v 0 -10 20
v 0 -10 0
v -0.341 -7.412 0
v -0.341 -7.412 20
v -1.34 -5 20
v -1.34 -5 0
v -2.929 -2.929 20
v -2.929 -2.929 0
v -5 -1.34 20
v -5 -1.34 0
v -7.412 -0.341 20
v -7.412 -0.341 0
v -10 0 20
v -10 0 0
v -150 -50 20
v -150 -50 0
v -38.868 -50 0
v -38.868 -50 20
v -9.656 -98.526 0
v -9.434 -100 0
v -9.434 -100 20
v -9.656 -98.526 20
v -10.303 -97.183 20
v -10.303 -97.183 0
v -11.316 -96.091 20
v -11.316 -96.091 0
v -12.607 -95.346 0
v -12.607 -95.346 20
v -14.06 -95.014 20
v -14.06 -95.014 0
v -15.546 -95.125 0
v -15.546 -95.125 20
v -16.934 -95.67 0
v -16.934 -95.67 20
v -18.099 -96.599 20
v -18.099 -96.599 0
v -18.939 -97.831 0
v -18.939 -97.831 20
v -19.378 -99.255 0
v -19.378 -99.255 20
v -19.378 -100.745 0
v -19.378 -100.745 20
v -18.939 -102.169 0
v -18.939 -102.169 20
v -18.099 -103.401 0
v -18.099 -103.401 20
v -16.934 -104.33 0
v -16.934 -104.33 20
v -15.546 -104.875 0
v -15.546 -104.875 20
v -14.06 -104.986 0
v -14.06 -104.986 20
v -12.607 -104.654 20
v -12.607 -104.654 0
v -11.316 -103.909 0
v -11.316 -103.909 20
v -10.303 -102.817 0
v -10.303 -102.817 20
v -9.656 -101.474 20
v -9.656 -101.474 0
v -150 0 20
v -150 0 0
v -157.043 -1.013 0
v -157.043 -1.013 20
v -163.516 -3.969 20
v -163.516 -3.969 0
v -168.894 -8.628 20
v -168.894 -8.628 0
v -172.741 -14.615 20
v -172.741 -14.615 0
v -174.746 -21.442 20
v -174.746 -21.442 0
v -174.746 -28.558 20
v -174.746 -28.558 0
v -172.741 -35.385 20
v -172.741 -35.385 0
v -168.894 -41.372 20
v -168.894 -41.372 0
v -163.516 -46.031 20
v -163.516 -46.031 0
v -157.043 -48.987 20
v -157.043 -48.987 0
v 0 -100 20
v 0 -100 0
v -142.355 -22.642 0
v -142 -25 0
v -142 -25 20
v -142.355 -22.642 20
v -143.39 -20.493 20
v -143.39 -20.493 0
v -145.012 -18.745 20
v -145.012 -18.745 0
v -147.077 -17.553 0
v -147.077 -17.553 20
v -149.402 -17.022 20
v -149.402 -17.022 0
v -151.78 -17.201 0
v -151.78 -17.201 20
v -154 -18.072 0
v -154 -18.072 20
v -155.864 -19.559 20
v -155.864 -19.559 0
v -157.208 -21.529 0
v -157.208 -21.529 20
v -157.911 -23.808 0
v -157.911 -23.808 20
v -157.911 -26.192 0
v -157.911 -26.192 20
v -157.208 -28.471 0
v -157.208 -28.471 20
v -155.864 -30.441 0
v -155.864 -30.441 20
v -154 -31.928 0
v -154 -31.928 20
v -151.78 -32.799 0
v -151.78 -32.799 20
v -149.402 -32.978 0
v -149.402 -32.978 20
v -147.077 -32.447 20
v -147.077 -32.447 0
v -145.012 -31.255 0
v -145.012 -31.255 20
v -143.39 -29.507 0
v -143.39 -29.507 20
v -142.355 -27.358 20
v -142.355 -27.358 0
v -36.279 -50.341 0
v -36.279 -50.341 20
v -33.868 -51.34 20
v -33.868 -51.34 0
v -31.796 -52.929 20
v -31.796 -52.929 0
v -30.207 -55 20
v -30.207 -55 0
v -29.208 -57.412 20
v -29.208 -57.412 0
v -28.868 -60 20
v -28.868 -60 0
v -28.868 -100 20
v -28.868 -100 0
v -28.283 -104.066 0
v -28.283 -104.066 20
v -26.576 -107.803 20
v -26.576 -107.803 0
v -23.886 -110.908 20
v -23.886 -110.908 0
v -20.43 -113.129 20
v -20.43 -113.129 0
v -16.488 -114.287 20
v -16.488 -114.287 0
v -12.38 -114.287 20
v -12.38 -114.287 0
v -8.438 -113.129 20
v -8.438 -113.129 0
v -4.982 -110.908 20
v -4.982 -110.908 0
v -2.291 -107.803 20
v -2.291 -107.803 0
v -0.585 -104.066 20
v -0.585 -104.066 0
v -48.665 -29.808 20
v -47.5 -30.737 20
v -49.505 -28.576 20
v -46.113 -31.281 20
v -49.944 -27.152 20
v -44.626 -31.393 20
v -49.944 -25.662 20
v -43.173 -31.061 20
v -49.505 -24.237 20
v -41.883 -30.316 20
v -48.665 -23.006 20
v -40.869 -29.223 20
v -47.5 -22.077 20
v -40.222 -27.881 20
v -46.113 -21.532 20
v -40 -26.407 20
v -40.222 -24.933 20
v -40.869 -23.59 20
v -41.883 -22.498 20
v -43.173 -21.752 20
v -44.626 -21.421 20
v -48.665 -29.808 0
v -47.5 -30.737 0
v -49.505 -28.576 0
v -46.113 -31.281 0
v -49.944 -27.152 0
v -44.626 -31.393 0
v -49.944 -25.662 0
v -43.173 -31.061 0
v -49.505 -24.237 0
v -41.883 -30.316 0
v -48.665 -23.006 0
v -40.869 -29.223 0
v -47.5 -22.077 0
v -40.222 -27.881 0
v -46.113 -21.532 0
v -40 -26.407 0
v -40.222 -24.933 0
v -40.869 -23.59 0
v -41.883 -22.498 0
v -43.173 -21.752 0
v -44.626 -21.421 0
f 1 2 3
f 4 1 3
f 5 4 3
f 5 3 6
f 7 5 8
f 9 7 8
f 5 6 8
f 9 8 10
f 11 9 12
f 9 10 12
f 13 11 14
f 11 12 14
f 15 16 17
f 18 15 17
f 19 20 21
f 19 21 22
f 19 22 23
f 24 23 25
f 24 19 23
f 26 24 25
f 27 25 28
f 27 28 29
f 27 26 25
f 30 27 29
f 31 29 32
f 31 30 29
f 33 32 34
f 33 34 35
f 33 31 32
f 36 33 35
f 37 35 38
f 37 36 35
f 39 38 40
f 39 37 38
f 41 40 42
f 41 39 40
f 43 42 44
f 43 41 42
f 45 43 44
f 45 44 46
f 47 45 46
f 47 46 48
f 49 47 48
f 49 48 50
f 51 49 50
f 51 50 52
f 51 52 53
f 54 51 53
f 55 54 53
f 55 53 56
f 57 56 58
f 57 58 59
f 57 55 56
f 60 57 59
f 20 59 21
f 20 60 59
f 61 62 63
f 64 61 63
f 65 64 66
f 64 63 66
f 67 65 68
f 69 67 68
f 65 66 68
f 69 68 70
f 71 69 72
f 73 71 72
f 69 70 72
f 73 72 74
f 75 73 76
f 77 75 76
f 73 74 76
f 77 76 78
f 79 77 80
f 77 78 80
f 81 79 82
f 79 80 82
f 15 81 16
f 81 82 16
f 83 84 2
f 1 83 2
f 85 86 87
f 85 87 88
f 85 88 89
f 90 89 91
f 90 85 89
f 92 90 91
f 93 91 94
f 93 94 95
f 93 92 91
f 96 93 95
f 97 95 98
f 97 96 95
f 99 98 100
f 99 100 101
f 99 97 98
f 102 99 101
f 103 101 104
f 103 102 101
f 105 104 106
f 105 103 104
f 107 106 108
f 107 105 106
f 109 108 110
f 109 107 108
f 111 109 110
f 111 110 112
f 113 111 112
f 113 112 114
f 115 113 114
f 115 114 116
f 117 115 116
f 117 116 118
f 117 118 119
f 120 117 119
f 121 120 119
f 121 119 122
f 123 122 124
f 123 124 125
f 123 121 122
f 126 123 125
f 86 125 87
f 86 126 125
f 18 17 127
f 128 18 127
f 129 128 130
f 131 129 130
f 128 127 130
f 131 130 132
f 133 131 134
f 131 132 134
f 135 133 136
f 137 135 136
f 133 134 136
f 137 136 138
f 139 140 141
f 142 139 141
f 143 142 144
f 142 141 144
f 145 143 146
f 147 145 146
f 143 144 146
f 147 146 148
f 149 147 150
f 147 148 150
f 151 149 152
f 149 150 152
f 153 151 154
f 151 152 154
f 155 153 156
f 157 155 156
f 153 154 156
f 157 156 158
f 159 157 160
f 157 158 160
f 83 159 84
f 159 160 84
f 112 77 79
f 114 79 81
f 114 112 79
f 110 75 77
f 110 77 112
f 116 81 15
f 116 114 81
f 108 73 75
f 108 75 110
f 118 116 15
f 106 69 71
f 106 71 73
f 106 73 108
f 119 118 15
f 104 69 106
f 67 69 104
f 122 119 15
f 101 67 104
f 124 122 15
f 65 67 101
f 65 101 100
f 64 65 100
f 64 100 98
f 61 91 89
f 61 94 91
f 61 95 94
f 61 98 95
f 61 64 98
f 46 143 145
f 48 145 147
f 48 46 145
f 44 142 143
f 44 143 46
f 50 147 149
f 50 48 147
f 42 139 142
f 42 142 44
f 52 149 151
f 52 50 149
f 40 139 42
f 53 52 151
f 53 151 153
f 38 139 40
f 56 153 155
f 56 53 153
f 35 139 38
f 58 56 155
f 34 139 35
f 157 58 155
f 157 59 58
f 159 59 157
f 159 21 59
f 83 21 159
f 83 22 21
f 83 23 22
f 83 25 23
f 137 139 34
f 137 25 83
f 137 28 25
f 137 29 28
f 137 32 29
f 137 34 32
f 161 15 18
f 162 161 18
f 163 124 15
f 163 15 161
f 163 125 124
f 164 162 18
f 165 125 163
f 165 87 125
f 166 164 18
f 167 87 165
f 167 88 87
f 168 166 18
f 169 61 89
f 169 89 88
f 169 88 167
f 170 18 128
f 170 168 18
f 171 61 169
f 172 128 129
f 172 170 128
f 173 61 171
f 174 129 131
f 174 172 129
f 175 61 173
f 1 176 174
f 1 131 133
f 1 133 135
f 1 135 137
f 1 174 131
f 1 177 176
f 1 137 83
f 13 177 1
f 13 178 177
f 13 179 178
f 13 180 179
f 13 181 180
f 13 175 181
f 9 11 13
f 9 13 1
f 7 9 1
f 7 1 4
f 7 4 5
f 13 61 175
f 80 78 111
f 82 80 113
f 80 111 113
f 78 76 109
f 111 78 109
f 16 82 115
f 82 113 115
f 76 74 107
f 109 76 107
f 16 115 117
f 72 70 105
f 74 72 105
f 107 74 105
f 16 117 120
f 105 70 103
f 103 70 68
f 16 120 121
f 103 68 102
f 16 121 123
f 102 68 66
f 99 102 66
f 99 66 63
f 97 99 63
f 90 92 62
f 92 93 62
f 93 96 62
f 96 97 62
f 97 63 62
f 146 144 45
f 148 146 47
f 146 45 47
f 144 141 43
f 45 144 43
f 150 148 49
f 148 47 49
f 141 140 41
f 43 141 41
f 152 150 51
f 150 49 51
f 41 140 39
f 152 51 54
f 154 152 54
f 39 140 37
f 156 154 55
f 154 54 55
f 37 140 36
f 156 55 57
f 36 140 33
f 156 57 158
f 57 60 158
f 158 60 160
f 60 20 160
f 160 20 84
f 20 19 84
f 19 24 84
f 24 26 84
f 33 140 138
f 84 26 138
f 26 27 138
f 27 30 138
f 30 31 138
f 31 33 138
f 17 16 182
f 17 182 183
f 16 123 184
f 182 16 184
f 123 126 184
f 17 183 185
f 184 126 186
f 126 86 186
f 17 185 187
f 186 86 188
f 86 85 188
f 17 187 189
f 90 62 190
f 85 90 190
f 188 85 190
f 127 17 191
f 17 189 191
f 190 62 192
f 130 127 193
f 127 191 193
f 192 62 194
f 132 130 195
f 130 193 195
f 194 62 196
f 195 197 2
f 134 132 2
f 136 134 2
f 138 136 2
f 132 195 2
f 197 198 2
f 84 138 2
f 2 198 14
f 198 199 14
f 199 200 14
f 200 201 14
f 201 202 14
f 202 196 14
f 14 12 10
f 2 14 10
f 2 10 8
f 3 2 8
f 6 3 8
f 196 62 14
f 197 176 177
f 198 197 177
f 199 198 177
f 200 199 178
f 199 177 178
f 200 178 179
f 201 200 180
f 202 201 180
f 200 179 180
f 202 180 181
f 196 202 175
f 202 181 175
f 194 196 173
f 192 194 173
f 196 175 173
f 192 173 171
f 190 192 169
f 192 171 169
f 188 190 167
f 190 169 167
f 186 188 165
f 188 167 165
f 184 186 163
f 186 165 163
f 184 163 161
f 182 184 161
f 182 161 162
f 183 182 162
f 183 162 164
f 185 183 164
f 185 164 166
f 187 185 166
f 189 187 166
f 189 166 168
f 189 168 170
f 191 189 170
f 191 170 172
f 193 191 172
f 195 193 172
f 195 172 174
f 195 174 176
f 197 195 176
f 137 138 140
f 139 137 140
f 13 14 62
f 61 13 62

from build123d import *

# Parameters (mm, degrees)
SKETCH1_R           = 8
SKETCH1_R_2         = 5
BOSS_EXTRUDE1_DEPTH = 20
SKETCH2_R           = 5
CUT_EXTRUDE1_DEPTH  = 35


with BuildPart() as part:
    # Sketch1 → Boss-Extrude1 (new body)
    with BuildSketch(Plane.XY):
        with BuildLine():
            Line((-10, 0), (-150, 0))
            ThreePointArc((-150, 0), (-175, -25), (-150, -50))
            Line((-150, -50), (-38.867513459, -50))
            ThreePointArc((-38.867513459, -50), (-31.796445648, -52.928932188), (-28.867513459, -60))
            Line((-28.867513459, -60), (-28.867513459, -100))
            ThreePointArc((-28.867513459, -100), (-14.43375673, -114.43375673), (0, -100))
            Line((0, -100), (0, -10))
            ThreePointArc((0, -10), (-2.928932188, -2.928932188), (-10, 0))
        make_face()
        with Locations((-150, -25)):
            Circle(SKETCH1_R, mode=Mode.SUBTRACT)
        with Locations((-14.43375673, -100)):
            Circle(SKETCH1_R_2, mode=Mode.SUBTRACT)
    extrude(amount=BOSS_EXTRUDE1_DEPTH)

    # Sketch2 → Cut-Extrude1 (cut)
    with BuildSketch(Plane.XY.offset(20)):
        with Locations((-45, -26.406771576)):
            Circle(SKETCH2_R)
    extrude(amount=-CUT_EXTRUDE1_DEPTH, mode=Mode.SUBTRACT)


solid = part.part
